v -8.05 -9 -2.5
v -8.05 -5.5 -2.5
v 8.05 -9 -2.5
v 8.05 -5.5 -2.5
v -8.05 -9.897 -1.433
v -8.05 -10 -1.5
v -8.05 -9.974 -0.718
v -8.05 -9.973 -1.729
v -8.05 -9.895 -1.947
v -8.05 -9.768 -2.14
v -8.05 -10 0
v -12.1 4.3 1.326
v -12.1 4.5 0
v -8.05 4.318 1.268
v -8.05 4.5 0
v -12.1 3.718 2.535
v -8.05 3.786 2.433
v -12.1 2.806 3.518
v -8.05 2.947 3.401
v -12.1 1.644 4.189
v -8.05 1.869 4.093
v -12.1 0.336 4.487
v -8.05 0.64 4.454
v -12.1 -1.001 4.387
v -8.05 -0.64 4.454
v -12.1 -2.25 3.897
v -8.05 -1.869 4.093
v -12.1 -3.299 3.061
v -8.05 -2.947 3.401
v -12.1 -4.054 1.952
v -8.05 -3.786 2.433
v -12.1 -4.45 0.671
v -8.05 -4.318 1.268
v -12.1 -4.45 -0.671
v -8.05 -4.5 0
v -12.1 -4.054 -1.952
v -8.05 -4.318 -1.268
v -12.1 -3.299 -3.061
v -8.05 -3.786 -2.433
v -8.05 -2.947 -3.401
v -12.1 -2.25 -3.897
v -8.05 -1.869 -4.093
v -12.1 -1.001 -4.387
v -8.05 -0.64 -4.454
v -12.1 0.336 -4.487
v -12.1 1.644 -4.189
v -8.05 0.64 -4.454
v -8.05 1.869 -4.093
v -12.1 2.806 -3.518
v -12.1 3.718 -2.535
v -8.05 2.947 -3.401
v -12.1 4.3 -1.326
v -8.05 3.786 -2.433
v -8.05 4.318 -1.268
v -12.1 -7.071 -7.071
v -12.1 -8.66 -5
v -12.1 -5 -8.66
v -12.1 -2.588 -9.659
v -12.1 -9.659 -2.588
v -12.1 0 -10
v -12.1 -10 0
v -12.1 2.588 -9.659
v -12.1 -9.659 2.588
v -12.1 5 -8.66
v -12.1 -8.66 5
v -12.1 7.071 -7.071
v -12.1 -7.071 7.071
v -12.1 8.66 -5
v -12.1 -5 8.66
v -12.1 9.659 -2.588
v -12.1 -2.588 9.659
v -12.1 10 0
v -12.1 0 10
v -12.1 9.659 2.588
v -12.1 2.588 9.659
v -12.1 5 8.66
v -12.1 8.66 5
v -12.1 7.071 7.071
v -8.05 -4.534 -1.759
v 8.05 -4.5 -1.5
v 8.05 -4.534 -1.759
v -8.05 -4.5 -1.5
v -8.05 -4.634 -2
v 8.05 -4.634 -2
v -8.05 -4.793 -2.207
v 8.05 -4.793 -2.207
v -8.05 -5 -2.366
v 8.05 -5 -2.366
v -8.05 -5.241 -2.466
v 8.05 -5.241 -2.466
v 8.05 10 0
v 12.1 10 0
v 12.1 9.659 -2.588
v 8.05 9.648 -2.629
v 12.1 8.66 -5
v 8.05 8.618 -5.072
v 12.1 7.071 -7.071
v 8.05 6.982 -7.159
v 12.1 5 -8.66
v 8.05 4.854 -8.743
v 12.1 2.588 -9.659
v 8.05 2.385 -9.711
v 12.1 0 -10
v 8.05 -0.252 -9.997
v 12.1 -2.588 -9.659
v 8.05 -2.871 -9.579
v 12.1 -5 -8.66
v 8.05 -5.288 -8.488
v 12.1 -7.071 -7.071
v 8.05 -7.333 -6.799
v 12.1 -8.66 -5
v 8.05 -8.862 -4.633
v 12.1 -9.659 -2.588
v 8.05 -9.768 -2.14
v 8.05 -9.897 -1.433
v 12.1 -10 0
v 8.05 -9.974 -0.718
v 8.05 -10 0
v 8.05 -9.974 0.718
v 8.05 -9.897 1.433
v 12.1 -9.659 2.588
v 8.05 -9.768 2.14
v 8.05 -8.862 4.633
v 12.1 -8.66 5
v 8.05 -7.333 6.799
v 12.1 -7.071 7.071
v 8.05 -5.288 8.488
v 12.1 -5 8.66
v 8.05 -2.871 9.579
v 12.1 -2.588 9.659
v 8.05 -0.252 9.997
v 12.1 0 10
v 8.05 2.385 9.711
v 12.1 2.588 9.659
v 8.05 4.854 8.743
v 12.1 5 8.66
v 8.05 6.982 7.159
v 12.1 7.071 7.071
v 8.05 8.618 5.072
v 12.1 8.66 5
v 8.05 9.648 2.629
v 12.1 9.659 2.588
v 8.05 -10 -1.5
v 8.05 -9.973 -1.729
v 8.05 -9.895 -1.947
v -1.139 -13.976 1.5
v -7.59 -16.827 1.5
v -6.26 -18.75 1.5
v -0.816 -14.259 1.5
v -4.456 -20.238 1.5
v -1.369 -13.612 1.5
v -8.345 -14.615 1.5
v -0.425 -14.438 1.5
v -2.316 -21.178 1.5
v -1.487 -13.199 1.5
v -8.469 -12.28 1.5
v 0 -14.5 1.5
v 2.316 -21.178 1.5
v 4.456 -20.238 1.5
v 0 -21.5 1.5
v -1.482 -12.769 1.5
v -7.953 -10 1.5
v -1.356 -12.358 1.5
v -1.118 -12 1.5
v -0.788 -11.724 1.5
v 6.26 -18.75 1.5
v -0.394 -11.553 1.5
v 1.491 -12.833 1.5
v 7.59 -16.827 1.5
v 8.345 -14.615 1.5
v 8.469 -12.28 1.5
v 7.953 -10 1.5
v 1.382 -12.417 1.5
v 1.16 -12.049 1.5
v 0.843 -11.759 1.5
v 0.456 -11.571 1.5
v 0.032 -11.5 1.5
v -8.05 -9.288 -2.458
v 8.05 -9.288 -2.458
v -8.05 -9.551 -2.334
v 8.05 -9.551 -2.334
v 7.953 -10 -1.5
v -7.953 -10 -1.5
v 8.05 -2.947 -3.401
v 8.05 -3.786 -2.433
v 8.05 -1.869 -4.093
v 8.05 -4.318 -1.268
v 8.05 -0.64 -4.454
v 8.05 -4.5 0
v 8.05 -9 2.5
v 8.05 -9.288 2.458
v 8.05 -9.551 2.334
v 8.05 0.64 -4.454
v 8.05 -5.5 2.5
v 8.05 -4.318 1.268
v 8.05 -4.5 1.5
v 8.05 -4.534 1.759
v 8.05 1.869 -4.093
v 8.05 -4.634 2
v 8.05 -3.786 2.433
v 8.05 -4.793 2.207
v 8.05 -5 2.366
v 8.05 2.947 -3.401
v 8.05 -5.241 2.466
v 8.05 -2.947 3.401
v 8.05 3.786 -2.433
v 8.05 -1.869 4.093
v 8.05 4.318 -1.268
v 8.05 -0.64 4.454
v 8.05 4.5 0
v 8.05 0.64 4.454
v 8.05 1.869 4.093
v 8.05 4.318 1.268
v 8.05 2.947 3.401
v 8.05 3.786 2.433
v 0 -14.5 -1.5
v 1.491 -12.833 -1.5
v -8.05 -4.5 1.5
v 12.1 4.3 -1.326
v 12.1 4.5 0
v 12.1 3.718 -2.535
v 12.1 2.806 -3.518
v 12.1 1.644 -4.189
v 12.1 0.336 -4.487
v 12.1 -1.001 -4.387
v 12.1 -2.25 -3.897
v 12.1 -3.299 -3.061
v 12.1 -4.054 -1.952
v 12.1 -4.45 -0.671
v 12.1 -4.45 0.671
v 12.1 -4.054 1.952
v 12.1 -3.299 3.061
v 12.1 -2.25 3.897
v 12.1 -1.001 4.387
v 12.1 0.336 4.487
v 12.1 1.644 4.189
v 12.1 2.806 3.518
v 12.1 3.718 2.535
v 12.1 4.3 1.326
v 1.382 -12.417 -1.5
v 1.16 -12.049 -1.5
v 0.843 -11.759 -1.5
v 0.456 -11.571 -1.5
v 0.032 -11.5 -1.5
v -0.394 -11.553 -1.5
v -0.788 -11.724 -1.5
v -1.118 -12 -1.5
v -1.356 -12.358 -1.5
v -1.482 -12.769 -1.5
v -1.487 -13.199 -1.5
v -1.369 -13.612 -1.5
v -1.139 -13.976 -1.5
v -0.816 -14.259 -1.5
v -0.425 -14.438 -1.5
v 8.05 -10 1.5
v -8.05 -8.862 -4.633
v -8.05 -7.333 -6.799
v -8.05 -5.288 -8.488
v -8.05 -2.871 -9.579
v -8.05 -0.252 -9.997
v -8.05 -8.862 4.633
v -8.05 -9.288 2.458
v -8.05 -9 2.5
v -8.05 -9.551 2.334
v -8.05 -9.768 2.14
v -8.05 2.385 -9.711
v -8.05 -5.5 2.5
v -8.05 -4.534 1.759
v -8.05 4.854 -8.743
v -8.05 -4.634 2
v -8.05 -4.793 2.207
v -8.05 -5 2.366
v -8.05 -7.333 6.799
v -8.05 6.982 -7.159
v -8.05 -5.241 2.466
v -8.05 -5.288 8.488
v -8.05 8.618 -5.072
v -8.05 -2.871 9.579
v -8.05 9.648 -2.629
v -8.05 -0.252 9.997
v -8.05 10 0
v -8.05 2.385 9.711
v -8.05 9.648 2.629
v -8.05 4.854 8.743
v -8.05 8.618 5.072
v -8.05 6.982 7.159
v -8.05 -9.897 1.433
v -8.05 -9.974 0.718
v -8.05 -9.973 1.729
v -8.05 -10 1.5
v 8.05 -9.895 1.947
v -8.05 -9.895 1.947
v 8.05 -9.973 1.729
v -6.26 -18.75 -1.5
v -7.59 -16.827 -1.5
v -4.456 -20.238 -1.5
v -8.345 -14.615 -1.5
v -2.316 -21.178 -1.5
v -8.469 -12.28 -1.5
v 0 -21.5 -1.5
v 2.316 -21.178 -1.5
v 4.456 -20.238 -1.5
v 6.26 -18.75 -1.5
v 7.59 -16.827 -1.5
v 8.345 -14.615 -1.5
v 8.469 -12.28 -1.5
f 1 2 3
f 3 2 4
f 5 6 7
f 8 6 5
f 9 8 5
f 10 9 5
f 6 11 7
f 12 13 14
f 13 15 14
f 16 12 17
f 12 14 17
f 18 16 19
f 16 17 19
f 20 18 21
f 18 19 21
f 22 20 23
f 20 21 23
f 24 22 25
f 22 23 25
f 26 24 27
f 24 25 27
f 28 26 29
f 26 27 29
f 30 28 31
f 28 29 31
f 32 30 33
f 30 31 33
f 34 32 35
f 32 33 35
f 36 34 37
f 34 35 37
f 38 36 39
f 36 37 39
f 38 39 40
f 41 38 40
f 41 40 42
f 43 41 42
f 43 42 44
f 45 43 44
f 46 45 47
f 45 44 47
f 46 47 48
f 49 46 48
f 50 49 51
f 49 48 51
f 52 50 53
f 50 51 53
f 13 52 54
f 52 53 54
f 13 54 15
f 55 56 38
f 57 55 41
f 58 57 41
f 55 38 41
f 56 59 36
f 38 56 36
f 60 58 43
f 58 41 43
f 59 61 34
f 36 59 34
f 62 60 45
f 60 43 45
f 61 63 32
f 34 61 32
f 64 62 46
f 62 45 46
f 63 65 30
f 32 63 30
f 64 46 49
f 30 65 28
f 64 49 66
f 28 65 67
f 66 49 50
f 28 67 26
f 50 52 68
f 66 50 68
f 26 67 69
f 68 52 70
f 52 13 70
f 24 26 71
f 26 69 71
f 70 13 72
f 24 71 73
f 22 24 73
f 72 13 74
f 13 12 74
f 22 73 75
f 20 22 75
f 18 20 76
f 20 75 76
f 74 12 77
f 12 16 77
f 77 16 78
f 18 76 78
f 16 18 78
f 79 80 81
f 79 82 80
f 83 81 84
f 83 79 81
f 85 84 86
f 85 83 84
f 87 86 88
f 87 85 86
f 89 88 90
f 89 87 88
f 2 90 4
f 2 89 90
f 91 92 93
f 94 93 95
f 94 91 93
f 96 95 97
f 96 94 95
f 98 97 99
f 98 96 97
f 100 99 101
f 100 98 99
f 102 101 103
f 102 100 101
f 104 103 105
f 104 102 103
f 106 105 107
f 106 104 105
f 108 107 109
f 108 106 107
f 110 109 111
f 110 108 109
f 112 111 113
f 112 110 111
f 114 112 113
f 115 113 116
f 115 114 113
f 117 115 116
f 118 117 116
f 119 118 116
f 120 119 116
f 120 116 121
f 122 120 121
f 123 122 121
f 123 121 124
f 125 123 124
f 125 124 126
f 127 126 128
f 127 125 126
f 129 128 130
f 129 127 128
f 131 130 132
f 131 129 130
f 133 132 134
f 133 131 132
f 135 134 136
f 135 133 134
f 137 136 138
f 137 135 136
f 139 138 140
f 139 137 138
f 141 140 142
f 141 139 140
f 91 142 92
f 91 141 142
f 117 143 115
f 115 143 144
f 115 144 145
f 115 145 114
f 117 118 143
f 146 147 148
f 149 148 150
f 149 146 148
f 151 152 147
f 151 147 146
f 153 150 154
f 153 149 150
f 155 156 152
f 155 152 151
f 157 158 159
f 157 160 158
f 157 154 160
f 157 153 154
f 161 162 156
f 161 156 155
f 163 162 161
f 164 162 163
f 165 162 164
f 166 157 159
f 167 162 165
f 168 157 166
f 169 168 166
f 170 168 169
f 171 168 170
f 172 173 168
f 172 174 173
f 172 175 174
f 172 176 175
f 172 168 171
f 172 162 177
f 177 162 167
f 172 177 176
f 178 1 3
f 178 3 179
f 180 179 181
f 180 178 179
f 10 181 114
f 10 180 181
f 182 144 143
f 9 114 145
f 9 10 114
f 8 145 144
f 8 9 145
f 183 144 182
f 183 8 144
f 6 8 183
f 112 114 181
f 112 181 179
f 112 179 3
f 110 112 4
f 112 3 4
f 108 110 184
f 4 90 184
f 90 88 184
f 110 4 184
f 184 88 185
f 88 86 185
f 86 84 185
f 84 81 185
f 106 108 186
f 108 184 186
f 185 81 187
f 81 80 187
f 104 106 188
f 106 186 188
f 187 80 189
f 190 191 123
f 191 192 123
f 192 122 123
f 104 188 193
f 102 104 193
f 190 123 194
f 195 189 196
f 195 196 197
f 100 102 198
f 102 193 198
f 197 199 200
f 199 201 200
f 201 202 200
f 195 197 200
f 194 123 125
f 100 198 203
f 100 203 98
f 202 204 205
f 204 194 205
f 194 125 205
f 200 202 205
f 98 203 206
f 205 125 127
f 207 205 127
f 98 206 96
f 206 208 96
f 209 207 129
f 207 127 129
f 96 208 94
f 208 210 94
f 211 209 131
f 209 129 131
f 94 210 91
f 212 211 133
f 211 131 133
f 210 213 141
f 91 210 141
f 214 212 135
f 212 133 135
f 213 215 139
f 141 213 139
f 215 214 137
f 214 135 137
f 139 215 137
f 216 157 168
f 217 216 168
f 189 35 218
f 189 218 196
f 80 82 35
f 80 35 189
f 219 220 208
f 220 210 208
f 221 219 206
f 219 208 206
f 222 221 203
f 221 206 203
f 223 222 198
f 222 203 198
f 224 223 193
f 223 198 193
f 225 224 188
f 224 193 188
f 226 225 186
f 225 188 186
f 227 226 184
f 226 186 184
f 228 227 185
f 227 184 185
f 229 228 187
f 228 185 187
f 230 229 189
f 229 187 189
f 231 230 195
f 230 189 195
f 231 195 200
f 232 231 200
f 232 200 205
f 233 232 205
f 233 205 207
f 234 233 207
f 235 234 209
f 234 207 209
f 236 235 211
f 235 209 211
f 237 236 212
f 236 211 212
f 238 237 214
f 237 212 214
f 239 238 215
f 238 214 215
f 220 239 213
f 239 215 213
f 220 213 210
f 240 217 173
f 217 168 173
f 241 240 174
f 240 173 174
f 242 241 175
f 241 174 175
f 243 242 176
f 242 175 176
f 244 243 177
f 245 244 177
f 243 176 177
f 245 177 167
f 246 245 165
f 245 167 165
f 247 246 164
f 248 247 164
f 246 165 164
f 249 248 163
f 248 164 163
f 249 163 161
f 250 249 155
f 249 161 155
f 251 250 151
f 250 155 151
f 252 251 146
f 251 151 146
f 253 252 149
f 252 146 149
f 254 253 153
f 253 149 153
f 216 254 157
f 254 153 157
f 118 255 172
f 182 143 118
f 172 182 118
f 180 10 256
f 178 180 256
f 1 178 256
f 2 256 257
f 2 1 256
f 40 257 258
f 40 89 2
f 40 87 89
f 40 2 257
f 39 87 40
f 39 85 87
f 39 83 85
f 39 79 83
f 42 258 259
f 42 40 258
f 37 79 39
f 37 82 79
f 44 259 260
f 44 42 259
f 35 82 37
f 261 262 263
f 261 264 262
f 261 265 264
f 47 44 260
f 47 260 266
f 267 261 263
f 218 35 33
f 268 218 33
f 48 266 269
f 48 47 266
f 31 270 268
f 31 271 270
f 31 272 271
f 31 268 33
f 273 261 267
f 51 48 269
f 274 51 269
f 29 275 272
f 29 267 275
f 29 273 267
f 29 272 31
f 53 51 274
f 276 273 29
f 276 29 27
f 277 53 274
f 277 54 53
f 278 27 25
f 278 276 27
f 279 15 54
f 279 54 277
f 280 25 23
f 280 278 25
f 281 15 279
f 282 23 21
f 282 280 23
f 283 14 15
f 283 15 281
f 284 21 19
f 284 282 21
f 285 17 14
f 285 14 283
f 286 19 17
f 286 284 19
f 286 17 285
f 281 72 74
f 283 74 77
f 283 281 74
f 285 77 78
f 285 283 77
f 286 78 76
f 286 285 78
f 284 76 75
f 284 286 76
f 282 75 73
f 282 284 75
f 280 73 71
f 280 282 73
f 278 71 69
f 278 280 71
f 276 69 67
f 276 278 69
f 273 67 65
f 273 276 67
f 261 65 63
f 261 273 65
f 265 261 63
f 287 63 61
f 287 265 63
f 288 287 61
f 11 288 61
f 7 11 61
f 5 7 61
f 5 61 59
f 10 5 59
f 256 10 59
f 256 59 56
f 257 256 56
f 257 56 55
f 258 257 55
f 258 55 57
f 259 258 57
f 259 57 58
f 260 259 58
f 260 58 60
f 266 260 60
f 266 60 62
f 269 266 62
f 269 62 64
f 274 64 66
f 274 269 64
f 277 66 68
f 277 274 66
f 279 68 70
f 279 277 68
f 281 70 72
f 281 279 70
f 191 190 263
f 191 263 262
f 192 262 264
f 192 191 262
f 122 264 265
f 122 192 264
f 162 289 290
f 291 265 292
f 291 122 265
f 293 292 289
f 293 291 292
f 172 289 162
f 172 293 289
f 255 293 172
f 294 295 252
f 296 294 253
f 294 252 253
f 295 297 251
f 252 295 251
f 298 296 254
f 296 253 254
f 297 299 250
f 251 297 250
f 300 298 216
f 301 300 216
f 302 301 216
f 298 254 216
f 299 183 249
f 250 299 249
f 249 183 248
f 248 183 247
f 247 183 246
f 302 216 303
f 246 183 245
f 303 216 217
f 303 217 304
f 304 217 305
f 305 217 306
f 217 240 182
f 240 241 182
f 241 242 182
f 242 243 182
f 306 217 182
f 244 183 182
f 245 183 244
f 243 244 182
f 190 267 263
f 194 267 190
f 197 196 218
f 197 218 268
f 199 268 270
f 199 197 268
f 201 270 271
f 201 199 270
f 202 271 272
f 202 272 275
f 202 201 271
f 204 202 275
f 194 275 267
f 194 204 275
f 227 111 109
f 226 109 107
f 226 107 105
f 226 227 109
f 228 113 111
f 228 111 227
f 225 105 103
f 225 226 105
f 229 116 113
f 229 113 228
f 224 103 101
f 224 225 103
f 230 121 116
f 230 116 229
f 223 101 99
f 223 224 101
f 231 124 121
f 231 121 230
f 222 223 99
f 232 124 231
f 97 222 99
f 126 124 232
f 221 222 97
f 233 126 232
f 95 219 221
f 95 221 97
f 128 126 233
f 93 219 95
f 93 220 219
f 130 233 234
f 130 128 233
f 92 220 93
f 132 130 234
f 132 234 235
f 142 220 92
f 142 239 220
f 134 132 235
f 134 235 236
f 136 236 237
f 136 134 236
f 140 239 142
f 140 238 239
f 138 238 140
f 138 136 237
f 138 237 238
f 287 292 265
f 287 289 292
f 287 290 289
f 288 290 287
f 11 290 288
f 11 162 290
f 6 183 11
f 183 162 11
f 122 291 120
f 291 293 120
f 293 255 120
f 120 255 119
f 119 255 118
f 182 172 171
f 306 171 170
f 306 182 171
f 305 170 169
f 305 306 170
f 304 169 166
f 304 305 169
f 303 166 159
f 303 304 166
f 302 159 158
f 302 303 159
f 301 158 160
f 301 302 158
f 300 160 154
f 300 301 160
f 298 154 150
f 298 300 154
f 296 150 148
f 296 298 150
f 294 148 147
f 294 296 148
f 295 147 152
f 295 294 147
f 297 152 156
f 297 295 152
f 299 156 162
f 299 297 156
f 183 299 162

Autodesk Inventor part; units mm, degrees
ref_plane "YZ Plane" through (0, 0, 0) normal (1, 0, 0) x (0, 1, 0)
ref_plane "XZ Plane" through (0, 0, 0) normal (0, 1, 0) x (-1, 0, 0)
ref_plane "XY Plane" through (0, 0, 0) normal (0, 0, 1) x (1, 0, 0)
sketch "Sketch1" plane through (0, 0, 0) normal (1, 0, 0) x (0, 1, 0)
  circle A0 centre (0, 0) radius 10
  circle A1 centre (0, 0) radius 4.5
  dimension "d0" = 20
  dimension "d1" = 9
extrude "Extrusion1" add sketch "Sketch1" along normal mid plane 24.2
extrude "Extrusion2" cut sketch "Sketch1" along normal mid plane 16.1
sketch "Sketch2" plane through (0, 0, 0) normal (0, 0, 1) x (1, 0, 0)
  line L0 (-8.05, -4.5) -> (-8.05, 4.5) projected
  line L1 (8.05, -10) -> (8.05, 10) projected
  line L2 (-8.05, -4.5) -> (8.05, -4.5)
  line L3 (8.05, -4.5) -> (8.05, -10)
  line L4 (8.05, -10) -> (-8.05, -10)
  line L5 (-8.05, -10) -> (-8.05, -4.5)
  circle A0 centre (0, -13) radius 8.5
  point P0 (0, 0)
  point P1 (0, -10)
  point P2 (-7.953, -10)
  point P3 (7.953, -10)
  dimension "d9" = 17
  dimension "d10" = 3
  dimension "d11" = 13
extrude "Extrusion3" add sketch "Sketch2" along normal mid plane 5 contours L4 A0 L2 L1 | L4 A0 | A0 L4 L5 L2 picked at (1.8811, -8.8812)
fillet "Fillet1" radius 1 4 edges at (0, -4.5, 2.5) (0, -4.5, -2.5) (0, -10, 2.5) (0, -10, -2.5)
extrude "Extrusion4" add sketch "Sketch2" along normal mid plane 3 contours A0 L4 picked at (-0.095, -17.4274)
sketch "Sketch3" plane through (0, 0, 1.5) normal (0, 0, 1) x (1, 0, 0)
  arc A0 (-7.953, -10) -> (7.953, -10) centre (0, -13) ccw projected
  circle A1 centre (0, -13) radius 1.5
  line L0 (0, -14.5) -> (1.4907, -12.8334)
  line L1 (-7.953, -10) -> (7.953, -10) projected
  point P0 (0, 0)
  dimension "d14" = 3
  dimension "d15" = 2.236
  dimension "d16" = 4.5
extrude "Extrusion5" cut sketch "Sketch3" against normal blind 3 contours L0 A1 picked at (0.0848, -13.7277)
properties part number "KnuclePart"
